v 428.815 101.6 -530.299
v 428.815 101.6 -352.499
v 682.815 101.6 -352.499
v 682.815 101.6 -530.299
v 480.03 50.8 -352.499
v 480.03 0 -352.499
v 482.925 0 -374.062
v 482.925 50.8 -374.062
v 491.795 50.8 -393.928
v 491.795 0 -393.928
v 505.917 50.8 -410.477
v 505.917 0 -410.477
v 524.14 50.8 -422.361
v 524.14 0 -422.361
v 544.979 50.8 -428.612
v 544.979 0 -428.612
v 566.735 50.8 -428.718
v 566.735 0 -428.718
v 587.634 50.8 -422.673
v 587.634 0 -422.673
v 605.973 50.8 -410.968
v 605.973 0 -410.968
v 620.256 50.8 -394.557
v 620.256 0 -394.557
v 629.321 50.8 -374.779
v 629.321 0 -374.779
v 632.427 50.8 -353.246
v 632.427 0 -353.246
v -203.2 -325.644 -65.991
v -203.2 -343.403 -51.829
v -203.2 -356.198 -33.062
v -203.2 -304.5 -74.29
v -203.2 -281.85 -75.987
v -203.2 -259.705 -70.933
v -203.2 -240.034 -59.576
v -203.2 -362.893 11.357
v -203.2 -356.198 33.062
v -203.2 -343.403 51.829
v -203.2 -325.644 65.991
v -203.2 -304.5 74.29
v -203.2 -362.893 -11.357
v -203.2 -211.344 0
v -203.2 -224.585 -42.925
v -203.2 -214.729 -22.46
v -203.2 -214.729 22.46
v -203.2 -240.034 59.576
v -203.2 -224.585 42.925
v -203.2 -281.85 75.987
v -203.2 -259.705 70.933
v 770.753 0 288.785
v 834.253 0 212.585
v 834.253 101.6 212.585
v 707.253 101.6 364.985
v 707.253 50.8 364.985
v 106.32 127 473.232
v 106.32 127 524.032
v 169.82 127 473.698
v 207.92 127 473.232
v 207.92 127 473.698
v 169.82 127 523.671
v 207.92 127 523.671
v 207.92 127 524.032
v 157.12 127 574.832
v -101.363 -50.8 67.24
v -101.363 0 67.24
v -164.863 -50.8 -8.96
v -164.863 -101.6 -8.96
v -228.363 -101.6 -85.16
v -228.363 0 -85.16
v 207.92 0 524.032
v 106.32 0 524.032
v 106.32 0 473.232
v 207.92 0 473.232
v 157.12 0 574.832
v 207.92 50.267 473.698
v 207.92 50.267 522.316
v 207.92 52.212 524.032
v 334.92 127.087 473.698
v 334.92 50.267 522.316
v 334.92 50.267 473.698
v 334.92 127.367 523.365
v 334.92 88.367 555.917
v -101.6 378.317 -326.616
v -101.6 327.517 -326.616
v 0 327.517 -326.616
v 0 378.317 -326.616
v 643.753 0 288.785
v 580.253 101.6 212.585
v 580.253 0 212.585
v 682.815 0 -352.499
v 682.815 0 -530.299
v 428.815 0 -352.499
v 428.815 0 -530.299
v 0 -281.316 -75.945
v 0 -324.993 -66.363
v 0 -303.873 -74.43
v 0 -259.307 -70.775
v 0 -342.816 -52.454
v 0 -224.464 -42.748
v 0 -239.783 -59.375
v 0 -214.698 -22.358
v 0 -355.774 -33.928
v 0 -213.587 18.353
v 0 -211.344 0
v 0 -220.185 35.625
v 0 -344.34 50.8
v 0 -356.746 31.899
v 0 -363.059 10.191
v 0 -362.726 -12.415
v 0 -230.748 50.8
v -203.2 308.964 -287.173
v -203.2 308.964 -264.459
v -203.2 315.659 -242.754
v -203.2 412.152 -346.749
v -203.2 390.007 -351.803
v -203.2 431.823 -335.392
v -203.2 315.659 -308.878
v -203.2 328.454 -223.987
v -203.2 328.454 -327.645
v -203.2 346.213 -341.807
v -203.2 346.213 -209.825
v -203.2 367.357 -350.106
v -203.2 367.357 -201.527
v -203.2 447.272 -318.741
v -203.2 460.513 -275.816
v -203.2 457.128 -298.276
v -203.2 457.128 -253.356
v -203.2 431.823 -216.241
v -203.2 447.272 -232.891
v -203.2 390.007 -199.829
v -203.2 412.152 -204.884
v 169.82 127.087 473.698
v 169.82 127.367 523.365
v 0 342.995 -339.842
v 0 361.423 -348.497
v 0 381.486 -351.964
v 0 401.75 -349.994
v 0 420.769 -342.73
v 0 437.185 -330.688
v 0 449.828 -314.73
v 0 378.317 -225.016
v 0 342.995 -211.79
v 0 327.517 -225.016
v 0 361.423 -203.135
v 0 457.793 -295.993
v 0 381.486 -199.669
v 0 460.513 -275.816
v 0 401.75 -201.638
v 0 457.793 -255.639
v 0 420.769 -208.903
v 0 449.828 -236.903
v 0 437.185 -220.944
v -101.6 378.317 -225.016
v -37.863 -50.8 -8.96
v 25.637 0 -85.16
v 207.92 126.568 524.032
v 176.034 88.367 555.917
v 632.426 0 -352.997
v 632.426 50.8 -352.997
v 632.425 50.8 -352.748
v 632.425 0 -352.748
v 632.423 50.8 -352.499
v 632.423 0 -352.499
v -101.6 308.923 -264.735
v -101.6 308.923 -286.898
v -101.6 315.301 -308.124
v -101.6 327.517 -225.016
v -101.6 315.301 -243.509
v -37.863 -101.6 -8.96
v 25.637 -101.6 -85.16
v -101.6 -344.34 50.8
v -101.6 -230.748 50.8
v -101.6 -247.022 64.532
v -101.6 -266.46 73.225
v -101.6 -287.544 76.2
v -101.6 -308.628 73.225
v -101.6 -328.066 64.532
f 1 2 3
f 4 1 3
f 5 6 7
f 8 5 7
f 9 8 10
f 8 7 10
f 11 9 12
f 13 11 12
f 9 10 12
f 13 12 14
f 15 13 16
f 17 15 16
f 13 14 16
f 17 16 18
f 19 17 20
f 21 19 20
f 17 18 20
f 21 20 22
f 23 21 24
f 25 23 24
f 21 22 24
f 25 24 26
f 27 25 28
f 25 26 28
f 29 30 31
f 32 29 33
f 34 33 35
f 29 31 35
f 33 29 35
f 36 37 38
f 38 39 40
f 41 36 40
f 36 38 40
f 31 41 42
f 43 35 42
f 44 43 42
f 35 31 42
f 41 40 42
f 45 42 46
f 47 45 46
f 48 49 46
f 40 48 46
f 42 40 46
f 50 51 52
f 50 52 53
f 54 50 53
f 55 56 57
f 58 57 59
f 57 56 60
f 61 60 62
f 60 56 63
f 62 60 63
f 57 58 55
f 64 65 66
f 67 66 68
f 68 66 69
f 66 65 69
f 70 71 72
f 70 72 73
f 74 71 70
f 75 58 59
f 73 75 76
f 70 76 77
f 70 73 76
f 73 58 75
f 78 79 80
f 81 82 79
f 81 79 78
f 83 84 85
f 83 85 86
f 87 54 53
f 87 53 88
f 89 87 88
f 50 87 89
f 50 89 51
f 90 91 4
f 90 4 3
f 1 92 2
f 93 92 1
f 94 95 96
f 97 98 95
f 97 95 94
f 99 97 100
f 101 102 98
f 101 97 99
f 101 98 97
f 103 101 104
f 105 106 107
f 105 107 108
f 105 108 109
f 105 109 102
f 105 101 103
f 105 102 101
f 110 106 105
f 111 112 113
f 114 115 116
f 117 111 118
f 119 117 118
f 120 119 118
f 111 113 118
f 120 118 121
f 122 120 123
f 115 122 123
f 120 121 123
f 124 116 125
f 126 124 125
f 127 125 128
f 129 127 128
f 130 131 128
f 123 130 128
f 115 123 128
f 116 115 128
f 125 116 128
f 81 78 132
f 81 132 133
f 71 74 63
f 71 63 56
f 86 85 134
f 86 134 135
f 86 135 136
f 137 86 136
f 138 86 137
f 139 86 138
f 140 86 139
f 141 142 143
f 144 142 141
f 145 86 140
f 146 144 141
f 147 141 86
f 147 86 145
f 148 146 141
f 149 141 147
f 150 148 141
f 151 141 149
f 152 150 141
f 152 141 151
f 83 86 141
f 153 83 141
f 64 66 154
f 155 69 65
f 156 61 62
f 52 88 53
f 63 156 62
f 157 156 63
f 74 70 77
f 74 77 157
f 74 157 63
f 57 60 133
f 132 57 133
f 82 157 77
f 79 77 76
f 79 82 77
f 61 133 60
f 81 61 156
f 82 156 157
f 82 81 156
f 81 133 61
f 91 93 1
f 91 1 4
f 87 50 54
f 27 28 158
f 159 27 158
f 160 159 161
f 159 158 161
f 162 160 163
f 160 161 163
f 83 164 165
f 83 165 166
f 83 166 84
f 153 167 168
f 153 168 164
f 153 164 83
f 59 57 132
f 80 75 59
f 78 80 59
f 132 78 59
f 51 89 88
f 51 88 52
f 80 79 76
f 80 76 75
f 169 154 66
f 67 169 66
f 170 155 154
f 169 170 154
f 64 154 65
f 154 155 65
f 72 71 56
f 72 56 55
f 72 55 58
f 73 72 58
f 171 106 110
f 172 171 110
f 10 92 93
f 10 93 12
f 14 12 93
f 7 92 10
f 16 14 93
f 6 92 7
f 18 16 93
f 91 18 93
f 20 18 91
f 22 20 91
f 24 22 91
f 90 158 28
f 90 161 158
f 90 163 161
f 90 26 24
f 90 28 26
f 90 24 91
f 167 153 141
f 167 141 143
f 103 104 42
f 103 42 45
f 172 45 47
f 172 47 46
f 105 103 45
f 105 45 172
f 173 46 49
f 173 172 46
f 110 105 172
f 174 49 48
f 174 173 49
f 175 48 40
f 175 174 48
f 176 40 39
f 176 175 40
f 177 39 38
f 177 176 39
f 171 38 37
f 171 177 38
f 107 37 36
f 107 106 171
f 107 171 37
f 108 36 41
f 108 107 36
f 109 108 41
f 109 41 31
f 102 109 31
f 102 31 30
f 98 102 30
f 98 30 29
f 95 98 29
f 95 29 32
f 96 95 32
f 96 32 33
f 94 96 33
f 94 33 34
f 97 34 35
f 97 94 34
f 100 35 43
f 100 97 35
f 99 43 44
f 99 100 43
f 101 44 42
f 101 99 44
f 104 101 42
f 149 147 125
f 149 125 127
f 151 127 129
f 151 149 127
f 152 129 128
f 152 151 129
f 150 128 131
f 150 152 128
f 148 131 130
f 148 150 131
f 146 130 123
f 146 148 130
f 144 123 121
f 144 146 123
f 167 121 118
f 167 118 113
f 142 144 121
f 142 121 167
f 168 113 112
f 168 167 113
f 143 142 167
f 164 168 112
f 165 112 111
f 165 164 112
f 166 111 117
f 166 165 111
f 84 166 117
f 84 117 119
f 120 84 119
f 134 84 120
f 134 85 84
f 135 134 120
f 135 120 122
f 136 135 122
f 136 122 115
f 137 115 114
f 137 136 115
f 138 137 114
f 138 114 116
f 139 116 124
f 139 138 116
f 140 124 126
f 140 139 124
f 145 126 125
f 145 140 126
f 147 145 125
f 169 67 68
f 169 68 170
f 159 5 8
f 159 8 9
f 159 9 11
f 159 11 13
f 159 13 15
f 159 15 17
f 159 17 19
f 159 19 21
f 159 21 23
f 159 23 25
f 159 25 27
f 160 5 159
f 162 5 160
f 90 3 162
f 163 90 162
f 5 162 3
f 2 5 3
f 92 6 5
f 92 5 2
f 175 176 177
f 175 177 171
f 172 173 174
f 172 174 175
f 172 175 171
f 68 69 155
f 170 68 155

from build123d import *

# Parameters (mm, degrees)
F1_DEPTH  = 101.6
F2_DEPTH  = 50.8
F4_DEPTH  = 101.6
F8_DEPTH  = 63.5
F10_DEPTH = 127
F13_DEPTH = 165.1
F14_R     = 76.2
F15_DEPTH = 203.2
F17_DEPTH = 101.6
F18_R     = 76.2
F19_DEPTH = 203.2
F21_DEPTH = 101.6
F23_DEPTH = 101.6
F25_DEPTH = 50.8


with BuildPart() as f1:
    # F0 (on Front) → F1 (new body)
    with BuildSketch(Plane.XZ):
        Polygon((-164.863427937, -8.9603857159), (-228.363427937, -85.1603857159), (25.636572063, -85.1603857159), (-37.863427937, -8.9603857159), align=None)
    extrude(amount=F1_DEPTH)

    # F0 (on Front) → F2 (join)
    with BuildSketch(Plane.XZ):
        Polygon((-164.863427937, -8.9603857159), (-228.363427937, -85.1603857159), (25.636572063, -85.1603857159), (-37.863427937, -8.9603857159), align=None)
        Polygon((-101.363427937, 67.2396142841), (-164.863427937, -8.9603857159), (-37.863427937, -8.9603857159), align=None)
    extrude(amount=F2_DEPTH)


with BuildPart() as f4:
    # F3 (on Front) → F4 (new body)
    with BuildSketch(Plane.XZ):
        Polygon((707.2532130639, 364.9845177531), (580.2532130639, 212.5845177531), (834.2532130639, 212.5845177531), align=None)
    extrude(amount=-F4_DEPTH)

    # F7 (on 3pt) → F8 (cut, symmetric)
    with BuildSketch(Plane.YZ.offset(707.2532130639)):
        Polygon((0, 364.9845177531), (0, 288.7845177531), (50.8, 364.9845177531), align=None)
    extrude(amount=F8_DEPTH, both=True, mode=Mode.SUBTRACT)


with BuildPart() as f10:
    # F9 (on Front) → F10 (new body)
    with BuildSketch(Plane.XZ):
        Polygon((106.3199856699, 524.0316329509), (106.3199856699, 473.2316329509), (207.9199856699, 473.2316329509), (207.9199856699, 524.0316329509), (157.1199856699, 574.8316329509), align=None)
    extrude(amount=-F10_DEPTH)

    # F12 (on offset) → F13 (join)
    with BuildSketch(Plane.YZ.offset(334.9199856699)):
        Polygon((50.2671275934, 522.3161099392), (50.2671275934, 473.6983532884), (127.0868412608, 473.6983532884), (127.3669932331, 523.3648785495), (88.3671275934, 555.9171515897), align=None)
    extrude(amount=-F13_DEPTH)


with BuildPart() as f15:
    # F14 (on Right) → F15 (new body)
    with BuildSketch(Plane.YZ):
        with Locations((-287.5439747137, 0)):
            Circle(F14_R)
    extrude(amount=-F15_DEPTH)

    # F16 (on face) → F17 (cut)
    with BuildSketch(Plane.YZ):
        with BuildLine():
            ThreePointArc((-230.7478480852, 50.8), (-287.5439747137, 76.2), (-344.3401013422, 50.8))
            Line((-344.3401013422, 50.8), (-230.7478480852, 50.8))
        make_face()
    extrude(amount=-F17_DEPTH, mode=Mode.SUBTRACT)


with BuildPart() as f19:
    # F18 (on Right) → F19 (new body)
    with BuildSketch(Plane.YZ):
        with Locations((384.3129873276, -275.8161425591)):
            Circle(F18_R)
    extrude(amount=-F19_DEPTH)

    # F20 (on face) → F21 (cut)
    with BuildSketch(Plane.YZ):
        with BuildLine():
            Line((378.3168606991, -225.0161425591), (327.5168606991, -225.0161425591))
            ThreePointArc((327.5168606991, -225.0161425591), (308.1129873276, -275.8161425591), (327.5168606991, -326.6161425591))
            Line((327.5168606991, -326.6161425591), (378.3168606991, -326.6161425591))
            Line((378.3168606991, -326.6161425591), (378.3168606991, -225.0161425591))
        make_face()
    extrude(amount=-F21_DEPTH, mode=Mode.SUBTRACT)


with BuildPart() as f23:
    # F22 (on Front) → F23 (new body)
    with BuildSketch(Plane.XZ):
        with BuildLine():
            Line((479.6147877455, -352.4993360819), (428.8147877455, -352.4993360819))
            Line((428.8147877455, -352.4993360819), (428.8147877455, -530.2993360819))
            Line((428.8147877455, -530.2993360819), (682.8147877455, -530.2993360819))
            Line((682.8147877455, -530.2993360819), (682.8147877455, -352.4993360819))
            Line((682.8147877455, -352.4993360819), (632.0147877455, -352.4993360819))
            ThreePointArc((632.0147877455, -352.4993360819), (555.8147877455, -428.6993360819), (479.6147877455, -352.4993360819))
        make_face()
        with BuildLine():
            Line((632.0147877455, -352.4993360819), (479.6147877455, -352.4993360819))
            ThreePointArc((479.6147877455, -352.4993360819), (555.8147877455, -428.6993360819), (632.0147877455, -352.4993360819))
        make_face()
    extrude(amount=-F23_DEPTH)

    # F24 (on face) → F25 (cut)
    with BuildSketch(Plane.XZ):
        with BuildLine():
            ThreePointArc((480.0301629447, -352.4993360819), (555.8530170091, -429.4453813257), (632.4265017671, -353.2462966256))
            ThreePointArc((632.4265017671, -353.2462966256), (632.4255864672, -352.8728118675), (632.4228405896, -352.4993360819))
            Line((632.4228405896, -352.4993360819), (480.0301629447, -352.4993360819))
        make_face()
    extrude(amount=-F25_DEPTH, mode=Mode.SUBTRACT)


solid = Compound([f1.part, f4.part, f10.part, f15.part, f19.part, f23.part])
